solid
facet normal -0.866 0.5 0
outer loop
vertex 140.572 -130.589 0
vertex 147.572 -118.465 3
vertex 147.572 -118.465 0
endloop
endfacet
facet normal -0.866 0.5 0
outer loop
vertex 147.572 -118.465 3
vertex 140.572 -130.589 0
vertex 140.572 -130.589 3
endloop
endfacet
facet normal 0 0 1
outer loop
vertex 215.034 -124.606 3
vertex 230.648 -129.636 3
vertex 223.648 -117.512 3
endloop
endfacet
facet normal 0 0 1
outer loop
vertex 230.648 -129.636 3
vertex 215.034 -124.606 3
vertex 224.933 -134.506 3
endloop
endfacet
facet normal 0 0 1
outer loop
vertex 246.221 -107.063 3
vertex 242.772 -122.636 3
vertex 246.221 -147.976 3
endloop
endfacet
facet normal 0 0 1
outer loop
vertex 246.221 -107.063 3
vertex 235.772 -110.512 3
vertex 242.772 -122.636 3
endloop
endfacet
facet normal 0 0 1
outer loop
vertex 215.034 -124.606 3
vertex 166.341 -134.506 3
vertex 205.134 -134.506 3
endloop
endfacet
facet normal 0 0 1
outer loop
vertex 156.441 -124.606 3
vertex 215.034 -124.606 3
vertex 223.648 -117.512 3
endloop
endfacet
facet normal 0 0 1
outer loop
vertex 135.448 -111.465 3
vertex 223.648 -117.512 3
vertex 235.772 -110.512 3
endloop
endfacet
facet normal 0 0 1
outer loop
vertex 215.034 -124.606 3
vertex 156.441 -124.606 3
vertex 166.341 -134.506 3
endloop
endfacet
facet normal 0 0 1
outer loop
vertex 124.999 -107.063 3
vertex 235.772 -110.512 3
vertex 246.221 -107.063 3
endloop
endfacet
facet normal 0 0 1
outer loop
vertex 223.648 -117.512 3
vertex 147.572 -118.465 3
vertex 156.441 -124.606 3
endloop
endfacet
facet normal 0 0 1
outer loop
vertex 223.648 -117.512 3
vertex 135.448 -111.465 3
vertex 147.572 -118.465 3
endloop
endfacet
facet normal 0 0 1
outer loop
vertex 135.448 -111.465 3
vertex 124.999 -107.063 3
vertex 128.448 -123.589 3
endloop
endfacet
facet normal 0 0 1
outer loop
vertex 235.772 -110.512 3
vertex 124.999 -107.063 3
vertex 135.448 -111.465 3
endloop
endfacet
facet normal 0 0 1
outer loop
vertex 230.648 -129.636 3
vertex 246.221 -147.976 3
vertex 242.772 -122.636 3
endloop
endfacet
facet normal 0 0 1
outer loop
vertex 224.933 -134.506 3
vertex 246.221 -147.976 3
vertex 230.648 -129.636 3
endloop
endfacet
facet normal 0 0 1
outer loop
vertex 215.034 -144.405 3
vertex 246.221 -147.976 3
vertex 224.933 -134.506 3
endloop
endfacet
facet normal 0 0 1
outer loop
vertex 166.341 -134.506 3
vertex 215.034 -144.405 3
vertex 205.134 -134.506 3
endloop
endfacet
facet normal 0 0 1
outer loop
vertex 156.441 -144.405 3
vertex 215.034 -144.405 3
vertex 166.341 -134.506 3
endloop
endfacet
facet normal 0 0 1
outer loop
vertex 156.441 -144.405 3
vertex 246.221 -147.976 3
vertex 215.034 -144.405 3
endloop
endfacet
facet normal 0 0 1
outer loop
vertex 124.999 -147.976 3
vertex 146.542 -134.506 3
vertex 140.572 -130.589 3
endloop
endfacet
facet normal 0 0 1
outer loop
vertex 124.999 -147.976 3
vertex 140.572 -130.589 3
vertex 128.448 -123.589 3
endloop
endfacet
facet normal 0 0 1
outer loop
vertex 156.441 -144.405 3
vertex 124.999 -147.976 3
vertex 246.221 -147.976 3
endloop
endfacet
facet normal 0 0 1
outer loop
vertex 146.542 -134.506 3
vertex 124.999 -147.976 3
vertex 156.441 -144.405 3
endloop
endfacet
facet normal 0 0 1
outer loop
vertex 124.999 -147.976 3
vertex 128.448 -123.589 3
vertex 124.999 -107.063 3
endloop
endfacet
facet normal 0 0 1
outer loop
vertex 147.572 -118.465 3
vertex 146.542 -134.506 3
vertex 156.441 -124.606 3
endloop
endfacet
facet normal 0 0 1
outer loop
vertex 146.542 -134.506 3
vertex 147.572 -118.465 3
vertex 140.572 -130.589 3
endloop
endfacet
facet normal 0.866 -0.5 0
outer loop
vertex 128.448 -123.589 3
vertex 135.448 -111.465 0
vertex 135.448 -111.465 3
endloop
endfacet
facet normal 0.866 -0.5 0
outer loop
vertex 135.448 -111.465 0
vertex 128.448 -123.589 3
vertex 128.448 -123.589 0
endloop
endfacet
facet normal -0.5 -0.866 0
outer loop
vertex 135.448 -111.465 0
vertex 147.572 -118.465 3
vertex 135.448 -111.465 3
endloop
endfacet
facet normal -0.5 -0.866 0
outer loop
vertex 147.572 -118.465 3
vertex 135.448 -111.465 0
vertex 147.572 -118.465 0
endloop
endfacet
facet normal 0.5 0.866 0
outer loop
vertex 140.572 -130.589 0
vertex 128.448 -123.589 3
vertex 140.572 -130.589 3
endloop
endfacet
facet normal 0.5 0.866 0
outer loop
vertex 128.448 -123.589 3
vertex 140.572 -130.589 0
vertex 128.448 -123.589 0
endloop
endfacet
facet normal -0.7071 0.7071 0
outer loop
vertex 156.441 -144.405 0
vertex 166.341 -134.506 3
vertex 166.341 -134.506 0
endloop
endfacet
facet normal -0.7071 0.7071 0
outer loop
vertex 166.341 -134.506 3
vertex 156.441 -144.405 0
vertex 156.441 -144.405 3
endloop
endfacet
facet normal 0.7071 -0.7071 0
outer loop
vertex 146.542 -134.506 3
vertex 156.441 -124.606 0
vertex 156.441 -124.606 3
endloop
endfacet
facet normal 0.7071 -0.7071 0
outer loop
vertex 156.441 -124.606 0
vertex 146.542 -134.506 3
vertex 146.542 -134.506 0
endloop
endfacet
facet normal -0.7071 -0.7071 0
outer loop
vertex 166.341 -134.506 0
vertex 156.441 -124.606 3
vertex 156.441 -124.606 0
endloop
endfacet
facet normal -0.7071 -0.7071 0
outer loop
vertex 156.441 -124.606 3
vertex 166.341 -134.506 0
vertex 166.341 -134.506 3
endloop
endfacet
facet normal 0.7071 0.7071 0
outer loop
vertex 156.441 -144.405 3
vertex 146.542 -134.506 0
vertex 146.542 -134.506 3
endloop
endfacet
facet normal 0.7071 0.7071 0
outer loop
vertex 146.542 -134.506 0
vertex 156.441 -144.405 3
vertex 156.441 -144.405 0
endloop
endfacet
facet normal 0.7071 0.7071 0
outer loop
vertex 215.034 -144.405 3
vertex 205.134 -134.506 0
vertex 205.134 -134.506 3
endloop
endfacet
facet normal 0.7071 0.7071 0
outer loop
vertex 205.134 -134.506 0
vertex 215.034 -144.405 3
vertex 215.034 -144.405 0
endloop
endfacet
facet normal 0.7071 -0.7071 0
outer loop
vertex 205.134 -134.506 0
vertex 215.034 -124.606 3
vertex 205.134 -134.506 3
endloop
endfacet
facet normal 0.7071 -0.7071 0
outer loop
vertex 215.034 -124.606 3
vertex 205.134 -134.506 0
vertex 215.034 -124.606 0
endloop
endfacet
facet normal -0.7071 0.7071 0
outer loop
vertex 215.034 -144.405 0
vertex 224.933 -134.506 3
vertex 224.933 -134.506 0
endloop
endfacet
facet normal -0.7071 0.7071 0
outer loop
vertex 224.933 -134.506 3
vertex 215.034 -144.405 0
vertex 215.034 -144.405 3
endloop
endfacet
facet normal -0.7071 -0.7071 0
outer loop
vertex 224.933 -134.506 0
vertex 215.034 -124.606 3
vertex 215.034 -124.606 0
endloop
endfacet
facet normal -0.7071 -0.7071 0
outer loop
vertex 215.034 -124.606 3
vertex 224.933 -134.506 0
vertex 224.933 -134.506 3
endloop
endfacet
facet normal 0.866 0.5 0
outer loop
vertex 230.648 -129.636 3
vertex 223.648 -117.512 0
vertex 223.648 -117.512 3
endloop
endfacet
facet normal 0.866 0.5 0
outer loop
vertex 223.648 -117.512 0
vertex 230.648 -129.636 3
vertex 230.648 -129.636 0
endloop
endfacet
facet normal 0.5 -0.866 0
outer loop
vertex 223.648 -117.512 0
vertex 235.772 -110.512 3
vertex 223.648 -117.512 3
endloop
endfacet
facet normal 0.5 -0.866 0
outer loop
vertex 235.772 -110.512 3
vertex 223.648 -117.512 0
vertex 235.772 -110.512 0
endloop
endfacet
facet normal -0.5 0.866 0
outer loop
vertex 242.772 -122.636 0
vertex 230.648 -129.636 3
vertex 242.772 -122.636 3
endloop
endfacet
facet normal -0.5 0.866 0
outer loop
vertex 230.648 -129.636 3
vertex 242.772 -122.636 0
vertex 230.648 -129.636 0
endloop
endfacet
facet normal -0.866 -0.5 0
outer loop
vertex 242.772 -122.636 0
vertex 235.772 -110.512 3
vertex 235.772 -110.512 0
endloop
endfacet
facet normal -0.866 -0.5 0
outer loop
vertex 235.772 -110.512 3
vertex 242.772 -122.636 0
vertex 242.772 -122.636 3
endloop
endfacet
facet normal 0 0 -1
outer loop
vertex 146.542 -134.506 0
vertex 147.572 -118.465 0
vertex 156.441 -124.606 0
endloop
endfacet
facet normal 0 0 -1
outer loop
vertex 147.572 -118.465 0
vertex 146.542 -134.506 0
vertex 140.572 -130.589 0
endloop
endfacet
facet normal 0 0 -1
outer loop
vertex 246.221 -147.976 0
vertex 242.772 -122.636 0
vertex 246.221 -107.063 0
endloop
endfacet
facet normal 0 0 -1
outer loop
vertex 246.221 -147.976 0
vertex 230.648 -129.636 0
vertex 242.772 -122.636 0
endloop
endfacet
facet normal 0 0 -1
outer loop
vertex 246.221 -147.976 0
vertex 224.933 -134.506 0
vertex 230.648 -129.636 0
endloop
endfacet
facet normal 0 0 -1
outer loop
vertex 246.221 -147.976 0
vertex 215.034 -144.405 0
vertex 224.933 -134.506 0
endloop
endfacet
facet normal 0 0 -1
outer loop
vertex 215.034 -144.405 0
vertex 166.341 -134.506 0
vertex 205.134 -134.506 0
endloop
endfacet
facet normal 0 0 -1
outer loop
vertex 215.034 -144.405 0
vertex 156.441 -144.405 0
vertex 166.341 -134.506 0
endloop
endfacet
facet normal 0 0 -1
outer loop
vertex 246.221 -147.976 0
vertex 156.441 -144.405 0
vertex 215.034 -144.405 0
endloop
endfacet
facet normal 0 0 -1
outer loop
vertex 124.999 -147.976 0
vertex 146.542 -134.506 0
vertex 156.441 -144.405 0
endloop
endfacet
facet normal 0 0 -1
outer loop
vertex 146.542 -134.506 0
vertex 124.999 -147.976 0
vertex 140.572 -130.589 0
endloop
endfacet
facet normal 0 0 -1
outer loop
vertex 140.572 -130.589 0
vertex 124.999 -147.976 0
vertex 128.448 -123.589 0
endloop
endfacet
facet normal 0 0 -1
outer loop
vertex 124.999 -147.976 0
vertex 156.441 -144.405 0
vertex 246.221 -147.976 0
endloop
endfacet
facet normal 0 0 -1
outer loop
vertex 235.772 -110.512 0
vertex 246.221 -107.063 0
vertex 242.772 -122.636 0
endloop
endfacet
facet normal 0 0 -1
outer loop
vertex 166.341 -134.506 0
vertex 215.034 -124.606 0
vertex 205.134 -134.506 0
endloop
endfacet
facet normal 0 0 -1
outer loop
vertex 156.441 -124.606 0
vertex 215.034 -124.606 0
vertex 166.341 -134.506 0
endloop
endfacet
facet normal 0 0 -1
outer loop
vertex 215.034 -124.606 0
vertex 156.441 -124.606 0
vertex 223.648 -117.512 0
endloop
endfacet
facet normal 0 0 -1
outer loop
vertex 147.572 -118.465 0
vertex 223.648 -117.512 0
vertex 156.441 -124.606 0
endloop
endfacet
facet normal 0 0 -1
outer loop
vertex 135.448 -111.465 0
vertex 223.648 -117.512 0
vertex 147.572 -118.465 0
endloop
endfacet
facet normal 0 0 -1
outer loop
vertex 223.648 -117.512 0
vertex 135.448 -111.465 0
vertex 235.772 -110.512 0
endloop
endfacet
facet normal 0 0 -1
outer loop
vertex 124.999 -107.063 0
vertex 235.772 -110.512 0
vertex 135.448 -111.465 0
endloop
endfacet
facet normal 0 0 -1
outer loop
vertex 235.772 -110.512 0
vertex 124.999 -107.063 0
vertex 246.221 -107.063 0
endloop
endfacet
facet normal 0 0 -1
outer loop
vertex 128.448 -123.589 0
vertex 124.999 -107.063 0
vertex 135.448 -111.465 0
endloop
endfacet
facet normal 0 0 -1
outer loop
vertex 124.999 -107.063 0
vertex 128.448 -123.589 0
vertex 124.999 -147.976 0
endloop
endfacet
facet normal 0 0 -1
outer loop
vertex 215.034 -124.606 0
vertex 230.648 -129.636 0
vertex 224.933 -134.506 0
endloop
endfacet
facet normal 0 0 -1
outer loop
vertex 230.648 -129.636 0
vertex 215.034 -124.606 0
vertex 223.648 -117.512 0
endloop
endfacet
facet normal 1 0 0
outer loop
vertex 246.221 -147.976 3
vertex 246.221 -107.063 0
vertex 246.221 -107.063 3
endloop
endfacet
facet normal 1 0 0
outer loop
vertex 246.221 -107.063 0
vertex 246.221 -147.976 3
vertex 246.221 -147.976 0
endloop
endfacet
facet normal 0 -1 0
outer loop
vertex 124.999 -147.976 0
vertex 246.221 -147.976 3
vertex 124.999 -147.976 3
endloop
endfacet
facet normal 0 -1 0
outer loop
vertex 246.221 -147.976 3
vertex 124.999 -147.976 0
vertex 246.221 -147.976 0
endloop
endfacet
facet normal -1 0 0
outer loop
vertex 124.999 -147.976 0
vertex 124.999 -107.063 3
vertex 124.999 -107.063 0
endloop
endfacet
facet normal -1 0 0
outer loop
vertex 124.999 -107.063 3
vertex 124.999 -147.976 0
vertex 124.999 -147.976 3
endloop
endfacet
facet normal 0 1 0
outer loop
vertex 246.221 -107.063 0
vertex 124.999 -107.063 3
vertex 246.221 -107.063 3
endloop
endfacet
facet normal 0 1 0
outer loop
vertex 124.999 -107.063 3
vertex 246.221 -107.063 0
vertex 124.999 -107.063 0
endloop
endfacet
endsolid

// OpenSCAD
$fn = $preview ? 0 : 100;


difference(){
	difference() {
		union() {
			linear_extrude(height = 3) {
				polygon(points = [[124.99852839420937, -147.97596045400934], [246.22125, -147.97596045400934], [246.22125, -107.06283240868598], [124.99852839420937, -107.06283240868598], [124.99852839420937, -147.97596045400934]]);
			}
		}
	}
	/* Holes Below*/
	union(){
		translate(v = [138.0099203653, -121.0267243797, 0]) {
			rotate(a = -30) {
				cube(center = true, size = [14, 14, 6]);
			}
		}
		translate(v = [156.4411152545, -134.5055762724, 0]) {
			rotate(a = -45) {
				cube(center = true, size = [14, 14, 6]);
			}
		}
		translate(v = [215.0338847455, -134.5055762724, 0]) {
			rotate(a = 45) {
				cube(center = true, size = [14, 14, 6]);
			}
		}
		translate(v = [233.2098580290, -120.0742243797, 0]) {
			rotate(a = 30) {
				cube(center = true, size = [14, 14, 6]);
			}
		}
	} /* End Holes */ 
}
